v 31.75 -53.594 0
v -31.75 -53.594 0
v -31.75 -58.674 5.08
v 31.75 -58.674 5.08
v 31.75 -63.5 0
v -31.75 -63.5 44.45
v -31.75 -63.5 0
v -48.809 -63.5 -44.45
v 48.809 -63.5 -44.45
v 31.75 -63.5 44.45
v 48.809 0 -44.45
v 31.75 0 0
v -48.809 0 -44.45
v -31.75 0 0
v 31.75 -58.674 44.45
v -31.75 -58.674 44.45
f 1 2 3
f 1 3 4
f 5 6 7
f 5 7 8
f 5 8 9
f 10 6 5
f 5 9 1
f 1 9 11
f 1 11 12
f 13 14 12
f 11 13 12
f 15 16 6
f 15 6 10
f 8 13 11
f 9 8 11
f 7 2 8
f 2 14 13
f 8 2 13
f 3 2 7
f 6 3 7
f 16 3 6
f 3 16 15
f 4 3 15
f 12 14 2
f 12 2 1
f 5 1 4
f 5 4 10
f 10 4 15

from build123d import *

# Parameters (mm, degrees)
F0_W     = 63.5
F0_H     = 44.45
F1_DEPTH = 63.5
F2_START = 58.674
F2_DEPTH = 4.826
F3_SIZE  = 5.08


with BuildPart() as f1:
    # F0 (on Front) → F1 (new body)
    with BuildSketch(Plane.XZ):
        Polygon((-48.8091893494, -44.45), (-31.75, -44.45), (-31.75, 0), align=None)
        with Locations((0, -22.225)):
            Rectangle(F0_W, F0_H)
        Polygon((31.75, 0), (31.75, -44.45), (48.8091893494, -44.45), align=None)
    extrude(amount=F1_DEPTH)

    # F0 (on Front) → F2 (join)
    with BuildSketch(Plane.XZ.offset(F2_START)):
        with Locations((0, 22.225)):
            Rectangle(F0_W, F0_H)
    extrude(amount=F2_DEPTH)

    # F3
    f3_edges = [f1.edges().sort_by_distance(p)[0] for p in [
        (0, -58.674, 0),
    ]]
    chamfer(f3_edges, length=F3_SIZE)


solid = f1.part
